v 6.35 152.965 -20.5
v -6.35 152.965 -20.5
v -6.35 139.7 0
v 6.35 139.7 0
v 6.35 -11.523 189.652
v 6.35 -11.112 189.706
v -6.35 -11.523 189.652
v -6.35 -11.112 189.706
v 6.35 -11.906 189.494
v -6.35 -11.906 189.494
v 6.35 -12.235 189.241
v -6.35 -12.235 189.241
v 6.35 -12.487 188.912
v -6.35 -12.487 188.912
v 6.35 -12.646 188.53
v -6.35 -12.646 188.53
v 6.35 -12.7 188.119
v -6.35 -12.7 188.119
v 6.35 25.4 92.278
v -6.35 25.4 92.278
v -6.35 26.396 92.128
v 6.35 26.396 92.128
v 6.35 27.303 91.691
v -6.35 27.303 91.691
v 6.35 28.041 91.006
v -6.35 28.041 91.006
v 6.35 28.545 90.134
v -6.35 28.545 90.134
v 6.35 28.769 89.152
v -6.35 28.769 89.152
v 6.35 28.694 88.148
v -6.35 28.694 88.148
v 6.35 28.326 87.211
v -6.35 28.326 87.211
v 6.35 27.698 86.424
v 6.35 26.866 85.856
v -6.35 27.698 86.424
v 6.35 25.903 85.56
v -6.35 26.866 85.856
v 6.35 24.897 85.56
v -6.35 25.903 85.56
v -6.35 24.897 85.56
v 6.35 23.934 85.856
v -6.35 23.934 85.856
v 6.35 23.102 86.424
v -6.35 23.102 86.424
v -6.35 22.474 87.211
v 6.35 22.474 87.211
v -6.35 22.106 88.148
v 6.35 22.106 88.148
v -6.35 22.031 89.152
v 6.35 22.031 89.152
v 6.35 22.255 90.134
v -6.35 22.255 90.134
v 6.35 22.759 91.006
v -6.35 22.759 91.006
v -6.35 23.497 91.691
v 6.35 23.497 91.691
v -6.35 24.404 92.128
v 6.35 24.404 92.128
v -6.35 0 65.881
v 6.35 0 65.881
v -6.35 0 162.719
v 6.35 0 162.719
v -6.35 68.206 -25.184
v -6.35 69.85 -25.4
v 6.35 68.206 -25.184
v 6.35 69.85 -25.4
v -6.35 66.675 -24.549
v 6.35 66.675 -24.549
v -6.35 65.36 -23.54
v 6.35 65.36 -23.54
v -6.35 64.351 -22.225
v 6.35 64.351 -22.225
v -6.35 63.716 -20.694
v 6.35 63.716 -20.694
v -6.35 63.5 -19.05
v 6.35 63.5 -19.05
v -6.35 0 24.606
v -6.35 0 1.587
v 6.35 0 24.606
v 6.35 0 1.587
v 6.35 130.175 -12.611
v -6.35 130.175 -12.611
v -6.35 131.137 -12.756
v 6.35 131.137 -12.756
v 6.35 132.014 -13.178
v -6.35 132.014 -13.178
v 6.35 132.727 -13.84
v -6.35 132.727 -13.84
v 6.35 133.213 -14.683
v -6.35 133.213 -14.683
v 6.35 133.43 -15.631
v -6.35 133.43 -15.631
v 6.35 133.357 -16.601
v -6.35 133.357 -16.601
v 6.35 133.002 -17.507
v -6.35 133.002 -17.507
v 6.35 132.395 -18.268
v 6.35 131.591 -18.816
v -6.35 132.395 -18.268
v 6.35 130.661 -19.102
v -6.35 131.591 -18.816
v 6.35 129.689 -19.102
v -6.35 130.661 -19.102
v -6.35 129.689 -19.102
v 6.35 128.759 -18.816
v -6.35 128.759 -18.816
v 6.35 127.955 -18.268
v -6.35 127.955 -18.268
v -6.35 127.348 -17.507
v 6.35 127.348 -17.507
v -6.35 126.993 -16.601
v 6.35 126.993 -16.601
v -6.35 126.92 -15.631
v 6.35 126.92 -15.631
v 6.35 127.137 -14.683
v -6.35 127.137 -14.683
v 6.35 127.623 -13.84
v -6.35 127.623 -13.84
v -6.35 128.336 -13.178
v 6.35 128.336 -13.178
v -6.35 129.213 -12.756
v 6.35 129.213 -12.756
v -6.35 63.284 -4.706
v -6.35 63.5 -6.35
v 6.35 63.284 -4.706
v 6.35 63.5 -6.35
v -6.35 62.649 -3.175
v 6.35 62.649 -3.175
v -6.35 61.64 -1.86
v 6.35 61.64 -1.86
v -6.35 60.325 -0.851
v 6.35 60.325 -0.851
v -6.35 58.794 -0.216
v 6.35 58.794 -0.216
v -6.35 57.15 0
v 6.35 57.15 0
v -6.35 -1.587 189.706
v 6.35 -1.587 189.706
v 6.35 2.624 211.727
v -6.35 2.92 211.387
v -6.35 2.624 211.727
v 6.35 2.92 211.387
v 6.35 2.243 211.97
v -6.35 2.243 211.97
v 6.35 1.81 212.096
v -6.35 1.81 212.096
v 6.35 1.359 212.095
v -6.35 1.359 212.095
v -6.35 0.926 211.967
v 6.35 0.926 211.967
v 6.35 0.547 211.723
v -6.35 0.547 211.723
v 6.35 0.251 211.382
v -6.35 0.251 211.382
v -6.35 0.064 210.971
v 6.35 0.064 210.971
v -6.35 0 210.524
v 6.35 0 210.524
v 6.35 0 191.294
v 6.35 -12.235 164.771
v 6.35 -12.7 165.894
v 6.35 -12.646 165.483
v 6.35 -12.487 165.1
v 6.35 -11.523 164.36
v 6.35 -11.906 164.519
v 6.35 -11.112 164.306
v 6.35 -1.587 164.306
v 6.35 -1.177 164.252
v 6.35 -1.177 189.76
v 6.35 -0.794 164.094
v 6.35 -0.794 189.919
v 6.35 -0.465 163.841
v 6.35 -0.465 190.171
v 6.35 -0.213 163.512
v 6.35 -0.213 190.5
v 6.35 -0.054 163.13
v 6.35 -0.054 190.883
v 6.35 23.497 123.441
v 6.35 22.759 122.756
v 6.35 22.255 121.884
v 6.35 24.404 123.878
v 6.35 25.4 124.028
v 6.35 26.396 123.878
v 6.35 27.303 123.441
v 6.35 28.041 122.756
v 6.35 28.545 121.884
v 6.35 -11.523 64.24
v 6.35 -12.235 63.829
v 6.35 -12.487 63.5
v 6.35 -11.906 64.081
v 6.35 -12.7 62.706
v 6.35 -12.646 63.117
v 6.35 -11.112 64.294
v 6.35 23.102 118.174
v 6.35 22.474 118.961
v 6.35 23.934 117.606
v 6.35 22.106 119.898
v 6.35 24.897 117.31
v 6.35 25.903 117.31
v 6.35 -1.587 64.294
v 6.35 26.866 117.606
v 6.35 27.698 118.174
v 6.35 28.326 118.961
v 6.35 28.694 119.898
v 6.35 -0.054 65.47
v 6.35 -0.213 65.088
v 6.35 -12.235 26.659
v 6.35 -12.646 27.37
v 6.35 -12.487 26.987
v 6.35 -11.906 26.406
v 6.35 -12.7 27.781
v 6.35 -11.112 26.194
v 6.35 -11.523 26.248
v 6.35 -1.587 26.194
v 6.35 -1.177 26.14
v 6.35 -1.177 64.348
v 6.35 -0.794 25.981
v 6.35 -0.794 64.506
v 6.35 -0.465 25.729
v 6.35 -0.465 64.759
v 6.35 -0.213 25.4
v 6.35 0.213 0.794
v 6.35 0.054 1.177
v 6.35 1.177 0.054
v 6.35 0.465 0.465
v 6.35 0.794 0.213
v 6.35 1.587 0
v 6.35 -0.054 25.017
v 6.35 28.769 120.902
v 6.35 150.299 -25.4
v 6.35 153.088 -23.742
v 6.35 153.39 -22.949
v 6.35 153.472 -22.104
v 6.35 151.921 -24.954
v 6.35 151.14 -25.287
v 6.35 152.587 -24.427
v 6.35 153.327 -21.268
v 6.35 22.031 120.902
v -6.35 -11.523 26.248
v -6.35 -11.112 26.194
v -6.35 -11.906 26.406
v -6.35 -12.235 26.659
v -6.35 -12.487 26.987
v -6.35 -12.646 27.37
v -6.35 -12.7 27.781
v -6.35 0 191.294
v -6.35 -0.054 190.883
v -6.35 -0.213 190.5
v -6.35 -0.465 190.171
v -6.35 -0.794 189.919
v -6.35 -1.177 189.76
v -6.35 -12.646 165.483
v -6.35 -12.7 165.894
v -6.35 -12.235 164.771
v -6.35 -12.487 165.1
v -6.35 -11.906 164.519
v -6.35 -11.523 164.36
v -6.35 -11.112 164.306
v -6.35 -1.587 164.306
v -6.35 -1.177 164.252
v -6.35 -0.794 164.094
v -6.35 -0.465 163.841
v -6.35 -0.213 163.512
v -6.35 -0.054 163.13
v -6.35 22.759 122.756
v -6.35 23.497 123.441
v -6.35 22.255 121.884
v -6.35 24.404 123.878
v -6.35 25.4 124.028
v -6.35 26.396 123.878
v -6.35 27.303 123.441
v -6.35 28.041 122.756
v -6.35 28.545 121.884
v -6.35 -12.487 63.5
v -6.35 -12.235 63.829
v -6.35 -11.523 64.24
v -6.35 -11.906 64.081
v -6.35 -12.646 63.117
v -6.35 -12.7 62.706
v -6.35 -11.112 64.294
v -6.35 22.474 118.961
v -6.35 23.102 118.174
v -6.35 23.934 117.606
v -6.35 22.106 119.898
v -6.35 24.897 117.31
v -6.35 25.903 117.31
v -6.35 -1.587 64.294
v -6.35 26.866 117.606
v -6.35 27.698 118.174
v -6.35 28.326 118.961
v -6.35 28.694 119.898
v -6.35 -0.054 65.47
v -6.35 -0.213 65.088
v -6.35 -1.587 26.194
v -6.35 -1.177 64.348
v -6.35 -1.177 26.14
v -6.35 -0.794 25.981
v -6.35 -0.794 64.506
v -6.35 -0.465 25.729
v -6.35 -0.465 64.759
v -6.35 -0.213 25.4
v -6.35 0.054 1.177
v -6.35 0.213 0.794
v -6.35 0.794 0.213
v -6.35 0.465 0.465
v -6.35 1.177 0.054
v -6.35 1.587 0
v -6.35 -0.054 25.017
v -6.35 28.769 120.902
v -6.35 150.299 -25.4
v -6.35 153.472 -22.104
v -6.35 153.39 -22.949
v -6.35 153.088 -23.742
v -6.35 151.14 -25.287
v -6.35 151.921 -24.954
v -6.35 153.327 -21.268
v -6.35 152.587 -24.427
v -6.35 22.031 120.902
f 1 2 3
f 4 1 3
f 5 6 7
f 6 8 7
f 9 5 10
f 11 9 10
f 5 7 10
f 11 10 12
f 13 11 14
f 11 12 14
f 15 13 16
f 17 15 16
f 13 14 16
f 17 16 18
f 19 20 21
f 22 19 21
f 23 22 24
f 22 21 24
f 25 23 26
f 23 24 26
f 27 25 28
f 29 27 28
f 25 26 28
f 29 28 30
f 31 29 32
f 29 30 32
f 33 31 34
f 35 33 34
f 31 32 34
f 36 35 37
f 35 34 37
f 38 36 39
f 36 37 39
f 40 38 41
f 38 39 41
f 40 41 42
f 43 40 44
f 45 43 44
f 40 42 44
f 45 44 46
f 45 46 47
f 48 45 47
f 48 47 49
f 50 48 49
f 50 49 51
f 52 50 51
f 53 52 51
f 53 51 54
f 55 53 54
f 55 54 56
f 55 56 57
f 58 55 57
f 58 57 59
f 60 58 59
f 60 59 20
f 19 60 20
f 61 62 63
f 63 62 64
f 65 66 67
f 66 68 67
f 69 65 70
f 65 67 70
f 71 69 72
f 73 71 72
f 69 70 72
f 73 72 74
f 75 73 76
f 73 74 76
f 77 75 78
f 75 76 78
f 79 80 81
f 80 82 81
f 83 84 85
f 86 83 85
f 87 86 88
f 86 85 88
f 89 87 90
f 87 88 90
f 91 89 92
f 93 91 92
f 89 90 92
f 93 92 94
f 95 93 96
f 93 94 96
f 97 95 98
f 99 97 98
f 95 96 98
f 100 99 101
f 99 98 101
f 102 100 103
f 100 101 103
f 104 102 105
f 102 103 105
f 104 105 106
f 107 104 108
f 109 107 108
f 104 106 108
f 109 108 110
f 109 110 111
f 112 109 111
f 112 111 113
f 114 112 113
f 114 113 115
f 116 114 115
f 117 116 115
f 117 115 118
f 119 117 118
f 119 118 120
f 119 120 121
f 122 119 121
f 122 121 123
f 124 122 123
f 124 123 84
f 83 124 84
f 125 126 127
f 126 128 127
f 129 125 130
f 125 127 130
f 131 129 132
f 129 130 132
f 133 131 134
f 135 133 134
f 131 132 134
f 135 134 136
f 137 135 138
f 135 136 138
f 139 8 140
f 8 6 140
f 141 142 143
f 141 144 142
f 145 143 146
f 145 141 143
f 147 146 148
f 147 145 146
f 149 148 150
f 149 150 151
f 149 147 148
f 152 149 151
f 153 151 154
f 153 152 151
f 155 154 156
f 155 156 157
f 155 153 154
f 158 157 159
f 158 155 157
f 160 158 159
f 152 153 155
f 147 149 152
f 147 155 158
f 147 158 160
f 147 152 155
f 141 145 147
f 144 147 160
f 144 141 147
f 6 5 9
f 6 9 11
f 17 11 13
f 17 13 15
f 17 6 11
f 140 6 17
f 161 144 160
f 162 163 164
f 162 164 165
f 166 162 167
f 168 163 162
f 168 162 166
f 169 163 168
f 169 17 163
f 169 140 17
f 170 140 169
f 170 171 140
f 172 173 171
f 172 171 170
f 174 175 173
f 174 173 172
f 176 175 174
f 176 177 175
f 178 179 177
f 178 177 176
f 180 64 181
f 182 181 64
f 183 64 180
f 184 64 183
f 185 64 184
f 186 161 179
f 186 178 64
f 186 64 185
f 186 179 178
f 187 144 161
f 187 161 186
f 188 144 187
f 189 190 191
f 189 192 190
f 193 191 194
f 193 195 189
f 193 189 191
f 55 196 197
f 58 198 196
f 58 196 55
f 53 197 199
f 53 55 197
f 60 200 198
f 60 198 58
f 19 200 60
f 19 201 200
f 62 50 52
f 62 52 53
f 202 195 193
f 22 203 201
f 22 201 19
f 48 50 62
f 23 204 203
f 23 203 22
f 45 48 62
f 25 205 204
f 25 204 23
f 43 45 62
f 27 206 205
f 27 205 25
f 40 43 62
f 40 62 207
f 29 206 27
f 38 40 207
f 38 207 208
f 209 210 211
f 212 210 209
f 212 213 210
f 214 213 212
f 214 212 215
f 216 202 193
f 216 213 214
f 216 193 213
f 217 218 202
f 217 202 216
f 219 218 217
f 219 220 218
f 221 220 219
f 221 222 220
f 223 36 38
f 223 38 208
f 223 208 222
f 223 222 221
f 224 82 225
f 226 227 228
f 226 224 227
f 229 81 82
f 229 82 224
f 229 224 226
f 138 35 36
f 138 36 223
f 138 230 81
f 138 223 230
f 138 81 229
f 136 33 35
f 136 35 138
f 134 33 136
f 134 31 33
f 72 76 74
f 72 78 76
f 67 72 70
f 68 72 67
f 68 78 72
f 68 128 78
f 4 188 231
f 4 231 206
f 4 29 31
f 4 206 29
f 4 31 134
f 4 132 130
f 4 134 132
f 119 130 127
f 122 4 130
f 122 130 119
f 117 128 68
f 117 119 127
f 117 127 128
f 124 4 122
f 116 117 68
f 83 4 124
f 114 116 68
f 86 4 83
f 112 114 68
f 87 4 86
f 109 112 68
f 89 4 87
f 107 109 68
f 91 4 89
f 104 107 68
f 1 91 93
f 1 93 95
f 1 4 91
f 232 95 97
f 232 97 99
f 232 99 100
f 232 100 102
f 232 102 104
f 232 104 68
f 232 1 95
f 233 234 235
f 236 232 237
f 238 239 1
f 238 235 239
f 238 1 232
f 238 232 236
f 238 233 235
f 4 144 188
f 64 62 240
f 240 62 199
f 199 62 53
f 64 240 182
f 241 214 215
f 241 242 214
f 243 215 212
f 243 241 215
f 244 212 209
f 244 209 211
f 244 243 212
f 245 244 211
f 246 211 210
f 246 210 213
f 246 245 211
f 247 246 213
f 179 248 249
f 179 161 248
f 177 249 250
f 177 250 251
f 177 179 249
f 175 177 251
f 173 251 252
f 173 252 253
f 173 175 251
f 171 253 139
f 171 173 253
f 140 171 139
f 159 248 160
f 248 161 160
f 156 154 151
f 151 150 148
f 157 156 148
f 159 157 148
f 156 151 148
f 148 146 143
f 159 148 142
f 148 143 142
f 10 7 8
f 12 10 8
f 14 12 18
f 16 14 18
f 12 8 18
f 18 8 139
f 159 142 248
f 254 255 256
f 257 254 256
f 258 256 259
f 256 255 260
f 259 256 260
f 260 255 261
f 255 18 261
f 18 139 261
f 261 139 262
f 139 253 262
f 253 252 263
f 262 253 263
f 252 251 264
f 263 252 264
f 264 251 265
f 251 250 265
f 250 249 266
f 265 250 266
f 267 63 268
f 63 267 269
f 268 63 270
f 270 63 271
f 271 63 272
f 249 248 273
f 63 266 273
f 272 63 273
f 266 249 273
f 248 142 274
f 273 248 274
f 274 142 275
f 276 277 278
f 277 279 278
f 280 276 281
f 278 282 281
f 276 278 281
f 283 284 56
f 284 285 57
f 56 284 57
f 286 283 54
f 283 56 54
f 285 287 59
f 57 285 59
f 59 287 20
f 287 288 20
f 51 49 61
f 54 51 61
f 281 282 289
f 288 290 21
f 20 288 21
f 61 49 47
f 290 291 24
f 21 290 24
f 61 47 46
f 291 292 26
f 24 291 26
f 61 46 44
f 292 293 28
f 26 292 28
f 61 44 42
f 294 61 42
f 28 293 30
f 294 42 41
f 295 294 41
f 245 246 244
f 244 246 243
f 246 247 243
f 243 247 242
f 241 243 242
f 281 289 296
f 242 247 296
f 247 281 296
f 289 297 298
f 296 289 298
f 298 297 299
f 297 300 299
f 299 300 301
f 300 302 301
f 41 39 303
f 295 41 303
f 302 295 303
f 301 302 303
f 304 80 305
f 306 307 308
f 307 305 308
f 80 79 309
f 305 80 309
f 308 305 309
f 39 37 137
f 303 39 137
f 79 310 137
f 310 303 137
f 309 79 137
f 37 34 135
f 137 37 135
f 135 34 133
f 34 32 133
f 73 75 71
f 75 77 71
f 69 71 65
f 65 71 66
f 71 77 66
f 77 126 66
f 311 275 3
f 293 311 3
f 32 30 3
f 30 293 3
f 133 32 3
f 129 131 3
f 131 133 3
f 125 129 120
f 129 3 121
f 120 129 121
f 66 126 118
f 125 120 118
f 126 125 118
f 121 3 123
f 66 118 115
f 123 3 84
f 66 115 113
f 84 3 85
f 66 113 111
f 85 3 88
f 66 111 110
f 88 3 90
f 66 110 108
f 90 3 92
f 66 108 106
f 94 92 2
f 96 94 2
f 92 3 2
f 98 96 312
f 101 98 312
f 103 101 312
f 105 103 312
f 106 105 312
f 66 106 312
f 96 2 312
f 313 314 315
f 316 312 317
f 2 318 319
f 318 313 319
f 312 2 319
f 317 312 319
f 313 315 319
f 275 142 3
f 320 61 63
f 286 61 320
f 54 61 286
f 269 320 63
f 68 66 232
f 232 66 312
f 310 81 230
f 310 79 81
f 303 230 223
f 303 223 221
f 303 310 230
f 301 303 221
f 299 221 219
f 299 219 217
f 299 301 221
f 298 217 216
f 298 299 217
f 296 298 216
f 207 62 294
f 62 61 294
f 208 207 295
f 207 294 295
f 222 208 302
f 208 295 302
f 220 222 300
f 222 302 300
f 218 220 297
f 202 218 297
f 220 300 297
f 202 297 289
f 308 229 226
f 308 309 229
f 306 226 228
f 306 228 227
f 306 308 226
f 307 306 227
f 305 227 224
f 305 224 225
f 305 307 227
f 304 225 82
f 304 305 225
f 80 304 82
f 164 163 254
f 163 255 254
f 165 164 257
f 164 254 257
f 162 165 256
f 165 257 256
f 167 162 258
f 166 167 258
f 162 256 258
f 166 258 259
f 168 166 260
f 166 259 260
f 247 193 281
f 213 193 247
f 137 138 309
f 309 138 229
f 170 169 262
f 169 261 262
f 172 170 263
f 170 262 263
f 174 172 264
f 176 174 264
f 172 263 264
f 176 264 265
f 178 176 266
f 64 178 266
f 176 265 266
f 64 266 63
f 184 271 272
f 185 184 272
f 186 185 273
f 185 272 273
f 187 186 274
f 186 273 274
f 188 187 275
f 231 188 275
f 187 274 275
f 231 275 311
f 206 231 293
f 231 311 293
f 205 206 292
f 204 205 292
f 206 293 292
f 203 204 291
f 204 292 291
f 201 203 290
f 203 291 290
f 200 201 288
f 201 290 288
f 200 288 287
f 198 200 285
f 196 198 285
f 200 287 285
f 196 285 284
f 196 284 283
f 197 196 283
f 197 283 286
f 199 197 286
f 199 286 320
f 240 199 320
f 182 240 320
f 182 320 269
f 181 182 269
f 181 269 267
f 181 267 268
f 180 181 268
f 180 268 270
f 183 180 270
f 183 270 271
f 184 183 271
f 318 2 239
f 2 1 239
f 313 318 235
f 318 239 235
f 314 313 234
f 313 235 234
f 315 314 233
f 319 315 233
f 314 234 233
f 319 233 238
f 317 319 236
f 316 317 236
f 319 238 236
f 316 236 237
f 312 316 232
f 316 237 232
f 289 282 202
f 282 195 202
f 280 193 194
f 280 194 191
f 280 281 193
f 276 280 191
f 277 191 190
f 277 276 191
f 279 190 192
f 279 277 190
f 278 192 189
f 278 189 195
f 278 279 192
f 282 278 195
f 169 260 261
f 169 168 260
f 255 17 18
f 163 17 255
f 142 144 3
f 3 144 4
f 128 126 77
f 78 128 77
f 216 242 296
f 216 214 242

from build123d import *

# Parameters (mm, degrees)
SKETCH1_W                   = 38.1
SKETCH1_H                   = 12.7
SKETCH1_W_2                 = 25.4
BOSS_EXTRUDE1_DEPTH         = 6.35
F_1_4_CLEARANCE_HOLE1_D     = 6.7564
F_1_4_CLEARANCE_HOLE1_DEPTH = 12.7
BOSS_EXTRUDE2_DEPTH         = 12.7
TOP_FILLET_R                = 3.175
BOTTOM_FILLETS_R            = 1.5875
F_1_4_CLEARANCE_HOLE2_D     = 6.5278
F_1_4_CLEARANCE_HOLE2_DEPTH = 12.7
FILLET1_R                   = 6.35


with BuildPart() as part:
    # Sketch1 → Boss-Extrude1 (new body, symmetric)
    with BuildSketch(Plane(origin=(0, 0, 0), x_dir=(0, 0, -1), z_dir=(1, 0, 0))):
        Polygon((0, 139.7), (0, 0), (-215.9, 0), align=None)
        with Locations((-45.24375, -6.35)):
            Rectangle(SKETCH1_W, SKETCH1_H)
        with Locations((-177.00625, -6.35)):
            Rectangle(SKETCH1_W_2, SKETCH1_H)
    extrude(amount=BOSS_EXTRUDE1_DEPTH, both=True)

    # 1/4 Clearance Hole1
    with Locations(Plane(origin=(6.35, 0, 0), x_dir=(0, 0, -1), z_dir=(1, 0, 0))):
        with Locations((-88.9, 25.4), (-120.65, 25.4)):
            Hole(F_1_4_CLEARANCE_HOLE1_D / 2, depth=F_1_4_CLEARANCE_HOLE1_DEPTH)

    # Sketch13 → Boss-Extrude2 (add, through all)
    with BuildSketch(Plane.ZY.offset(6.35)):
        Polygon((-25.4, 156.135294118), (0, 139.7), (0, 63.5), (-25.4, 63.5), align=None)
    extrude(amount=-BOSS_EXTRUDE2_DEPTH)

    # top fillet
    top_fillet_edges = [part.edges().sort_by_distance(p)[0] for p in [
        (0, 156.135294118, -25.4),
    ]]
    fillet(top_fillet_edges, radius=TOP_FILLET_R)

    # bottom fillets
    bottom_fillets_edges = [part.edges().sort_by_distance(p)[0] for p in [
        (0, 0, 0),
        (0, 0, 26.19375),
        (0, -12.7, 26.19375),
        (0, -12.7, 64.29375),
        (0, 0, 64.29375),
        (0, 0, 164.30625),
        (0, -12.7, 164.30625),
        (0, -12.7, 189.70625),
        (0, 0, 189.70625),
        (0, 0, 215.9),
    ]]
    fillet(bottom_fillets_edges, radius=BOTTOM_FILLETS_R)

    # 1/4 Clearance Hole2
    with Locations(Plane(origin=(6.35, 0, 0), x_dir=(0, 0, -1), z_dir=(1, 0, 0))):
        with Locations((15.875, 130.175)):
            Hole(F_1_4_CLEARANCE_HOLE2_D / 2, depth=F_1_4_CLEARANCE_HOLE2_DEPTH)

    # Fillet1
    fillet1_edges = [part.edges().sort_by_distance(p)[0] for p in [
        (0, 63.5, -25.4),
        (0, 63.5, 0),
    ]]
    fillet(fillet1_edges, radius=FILLET1_R)


solid = part.part
